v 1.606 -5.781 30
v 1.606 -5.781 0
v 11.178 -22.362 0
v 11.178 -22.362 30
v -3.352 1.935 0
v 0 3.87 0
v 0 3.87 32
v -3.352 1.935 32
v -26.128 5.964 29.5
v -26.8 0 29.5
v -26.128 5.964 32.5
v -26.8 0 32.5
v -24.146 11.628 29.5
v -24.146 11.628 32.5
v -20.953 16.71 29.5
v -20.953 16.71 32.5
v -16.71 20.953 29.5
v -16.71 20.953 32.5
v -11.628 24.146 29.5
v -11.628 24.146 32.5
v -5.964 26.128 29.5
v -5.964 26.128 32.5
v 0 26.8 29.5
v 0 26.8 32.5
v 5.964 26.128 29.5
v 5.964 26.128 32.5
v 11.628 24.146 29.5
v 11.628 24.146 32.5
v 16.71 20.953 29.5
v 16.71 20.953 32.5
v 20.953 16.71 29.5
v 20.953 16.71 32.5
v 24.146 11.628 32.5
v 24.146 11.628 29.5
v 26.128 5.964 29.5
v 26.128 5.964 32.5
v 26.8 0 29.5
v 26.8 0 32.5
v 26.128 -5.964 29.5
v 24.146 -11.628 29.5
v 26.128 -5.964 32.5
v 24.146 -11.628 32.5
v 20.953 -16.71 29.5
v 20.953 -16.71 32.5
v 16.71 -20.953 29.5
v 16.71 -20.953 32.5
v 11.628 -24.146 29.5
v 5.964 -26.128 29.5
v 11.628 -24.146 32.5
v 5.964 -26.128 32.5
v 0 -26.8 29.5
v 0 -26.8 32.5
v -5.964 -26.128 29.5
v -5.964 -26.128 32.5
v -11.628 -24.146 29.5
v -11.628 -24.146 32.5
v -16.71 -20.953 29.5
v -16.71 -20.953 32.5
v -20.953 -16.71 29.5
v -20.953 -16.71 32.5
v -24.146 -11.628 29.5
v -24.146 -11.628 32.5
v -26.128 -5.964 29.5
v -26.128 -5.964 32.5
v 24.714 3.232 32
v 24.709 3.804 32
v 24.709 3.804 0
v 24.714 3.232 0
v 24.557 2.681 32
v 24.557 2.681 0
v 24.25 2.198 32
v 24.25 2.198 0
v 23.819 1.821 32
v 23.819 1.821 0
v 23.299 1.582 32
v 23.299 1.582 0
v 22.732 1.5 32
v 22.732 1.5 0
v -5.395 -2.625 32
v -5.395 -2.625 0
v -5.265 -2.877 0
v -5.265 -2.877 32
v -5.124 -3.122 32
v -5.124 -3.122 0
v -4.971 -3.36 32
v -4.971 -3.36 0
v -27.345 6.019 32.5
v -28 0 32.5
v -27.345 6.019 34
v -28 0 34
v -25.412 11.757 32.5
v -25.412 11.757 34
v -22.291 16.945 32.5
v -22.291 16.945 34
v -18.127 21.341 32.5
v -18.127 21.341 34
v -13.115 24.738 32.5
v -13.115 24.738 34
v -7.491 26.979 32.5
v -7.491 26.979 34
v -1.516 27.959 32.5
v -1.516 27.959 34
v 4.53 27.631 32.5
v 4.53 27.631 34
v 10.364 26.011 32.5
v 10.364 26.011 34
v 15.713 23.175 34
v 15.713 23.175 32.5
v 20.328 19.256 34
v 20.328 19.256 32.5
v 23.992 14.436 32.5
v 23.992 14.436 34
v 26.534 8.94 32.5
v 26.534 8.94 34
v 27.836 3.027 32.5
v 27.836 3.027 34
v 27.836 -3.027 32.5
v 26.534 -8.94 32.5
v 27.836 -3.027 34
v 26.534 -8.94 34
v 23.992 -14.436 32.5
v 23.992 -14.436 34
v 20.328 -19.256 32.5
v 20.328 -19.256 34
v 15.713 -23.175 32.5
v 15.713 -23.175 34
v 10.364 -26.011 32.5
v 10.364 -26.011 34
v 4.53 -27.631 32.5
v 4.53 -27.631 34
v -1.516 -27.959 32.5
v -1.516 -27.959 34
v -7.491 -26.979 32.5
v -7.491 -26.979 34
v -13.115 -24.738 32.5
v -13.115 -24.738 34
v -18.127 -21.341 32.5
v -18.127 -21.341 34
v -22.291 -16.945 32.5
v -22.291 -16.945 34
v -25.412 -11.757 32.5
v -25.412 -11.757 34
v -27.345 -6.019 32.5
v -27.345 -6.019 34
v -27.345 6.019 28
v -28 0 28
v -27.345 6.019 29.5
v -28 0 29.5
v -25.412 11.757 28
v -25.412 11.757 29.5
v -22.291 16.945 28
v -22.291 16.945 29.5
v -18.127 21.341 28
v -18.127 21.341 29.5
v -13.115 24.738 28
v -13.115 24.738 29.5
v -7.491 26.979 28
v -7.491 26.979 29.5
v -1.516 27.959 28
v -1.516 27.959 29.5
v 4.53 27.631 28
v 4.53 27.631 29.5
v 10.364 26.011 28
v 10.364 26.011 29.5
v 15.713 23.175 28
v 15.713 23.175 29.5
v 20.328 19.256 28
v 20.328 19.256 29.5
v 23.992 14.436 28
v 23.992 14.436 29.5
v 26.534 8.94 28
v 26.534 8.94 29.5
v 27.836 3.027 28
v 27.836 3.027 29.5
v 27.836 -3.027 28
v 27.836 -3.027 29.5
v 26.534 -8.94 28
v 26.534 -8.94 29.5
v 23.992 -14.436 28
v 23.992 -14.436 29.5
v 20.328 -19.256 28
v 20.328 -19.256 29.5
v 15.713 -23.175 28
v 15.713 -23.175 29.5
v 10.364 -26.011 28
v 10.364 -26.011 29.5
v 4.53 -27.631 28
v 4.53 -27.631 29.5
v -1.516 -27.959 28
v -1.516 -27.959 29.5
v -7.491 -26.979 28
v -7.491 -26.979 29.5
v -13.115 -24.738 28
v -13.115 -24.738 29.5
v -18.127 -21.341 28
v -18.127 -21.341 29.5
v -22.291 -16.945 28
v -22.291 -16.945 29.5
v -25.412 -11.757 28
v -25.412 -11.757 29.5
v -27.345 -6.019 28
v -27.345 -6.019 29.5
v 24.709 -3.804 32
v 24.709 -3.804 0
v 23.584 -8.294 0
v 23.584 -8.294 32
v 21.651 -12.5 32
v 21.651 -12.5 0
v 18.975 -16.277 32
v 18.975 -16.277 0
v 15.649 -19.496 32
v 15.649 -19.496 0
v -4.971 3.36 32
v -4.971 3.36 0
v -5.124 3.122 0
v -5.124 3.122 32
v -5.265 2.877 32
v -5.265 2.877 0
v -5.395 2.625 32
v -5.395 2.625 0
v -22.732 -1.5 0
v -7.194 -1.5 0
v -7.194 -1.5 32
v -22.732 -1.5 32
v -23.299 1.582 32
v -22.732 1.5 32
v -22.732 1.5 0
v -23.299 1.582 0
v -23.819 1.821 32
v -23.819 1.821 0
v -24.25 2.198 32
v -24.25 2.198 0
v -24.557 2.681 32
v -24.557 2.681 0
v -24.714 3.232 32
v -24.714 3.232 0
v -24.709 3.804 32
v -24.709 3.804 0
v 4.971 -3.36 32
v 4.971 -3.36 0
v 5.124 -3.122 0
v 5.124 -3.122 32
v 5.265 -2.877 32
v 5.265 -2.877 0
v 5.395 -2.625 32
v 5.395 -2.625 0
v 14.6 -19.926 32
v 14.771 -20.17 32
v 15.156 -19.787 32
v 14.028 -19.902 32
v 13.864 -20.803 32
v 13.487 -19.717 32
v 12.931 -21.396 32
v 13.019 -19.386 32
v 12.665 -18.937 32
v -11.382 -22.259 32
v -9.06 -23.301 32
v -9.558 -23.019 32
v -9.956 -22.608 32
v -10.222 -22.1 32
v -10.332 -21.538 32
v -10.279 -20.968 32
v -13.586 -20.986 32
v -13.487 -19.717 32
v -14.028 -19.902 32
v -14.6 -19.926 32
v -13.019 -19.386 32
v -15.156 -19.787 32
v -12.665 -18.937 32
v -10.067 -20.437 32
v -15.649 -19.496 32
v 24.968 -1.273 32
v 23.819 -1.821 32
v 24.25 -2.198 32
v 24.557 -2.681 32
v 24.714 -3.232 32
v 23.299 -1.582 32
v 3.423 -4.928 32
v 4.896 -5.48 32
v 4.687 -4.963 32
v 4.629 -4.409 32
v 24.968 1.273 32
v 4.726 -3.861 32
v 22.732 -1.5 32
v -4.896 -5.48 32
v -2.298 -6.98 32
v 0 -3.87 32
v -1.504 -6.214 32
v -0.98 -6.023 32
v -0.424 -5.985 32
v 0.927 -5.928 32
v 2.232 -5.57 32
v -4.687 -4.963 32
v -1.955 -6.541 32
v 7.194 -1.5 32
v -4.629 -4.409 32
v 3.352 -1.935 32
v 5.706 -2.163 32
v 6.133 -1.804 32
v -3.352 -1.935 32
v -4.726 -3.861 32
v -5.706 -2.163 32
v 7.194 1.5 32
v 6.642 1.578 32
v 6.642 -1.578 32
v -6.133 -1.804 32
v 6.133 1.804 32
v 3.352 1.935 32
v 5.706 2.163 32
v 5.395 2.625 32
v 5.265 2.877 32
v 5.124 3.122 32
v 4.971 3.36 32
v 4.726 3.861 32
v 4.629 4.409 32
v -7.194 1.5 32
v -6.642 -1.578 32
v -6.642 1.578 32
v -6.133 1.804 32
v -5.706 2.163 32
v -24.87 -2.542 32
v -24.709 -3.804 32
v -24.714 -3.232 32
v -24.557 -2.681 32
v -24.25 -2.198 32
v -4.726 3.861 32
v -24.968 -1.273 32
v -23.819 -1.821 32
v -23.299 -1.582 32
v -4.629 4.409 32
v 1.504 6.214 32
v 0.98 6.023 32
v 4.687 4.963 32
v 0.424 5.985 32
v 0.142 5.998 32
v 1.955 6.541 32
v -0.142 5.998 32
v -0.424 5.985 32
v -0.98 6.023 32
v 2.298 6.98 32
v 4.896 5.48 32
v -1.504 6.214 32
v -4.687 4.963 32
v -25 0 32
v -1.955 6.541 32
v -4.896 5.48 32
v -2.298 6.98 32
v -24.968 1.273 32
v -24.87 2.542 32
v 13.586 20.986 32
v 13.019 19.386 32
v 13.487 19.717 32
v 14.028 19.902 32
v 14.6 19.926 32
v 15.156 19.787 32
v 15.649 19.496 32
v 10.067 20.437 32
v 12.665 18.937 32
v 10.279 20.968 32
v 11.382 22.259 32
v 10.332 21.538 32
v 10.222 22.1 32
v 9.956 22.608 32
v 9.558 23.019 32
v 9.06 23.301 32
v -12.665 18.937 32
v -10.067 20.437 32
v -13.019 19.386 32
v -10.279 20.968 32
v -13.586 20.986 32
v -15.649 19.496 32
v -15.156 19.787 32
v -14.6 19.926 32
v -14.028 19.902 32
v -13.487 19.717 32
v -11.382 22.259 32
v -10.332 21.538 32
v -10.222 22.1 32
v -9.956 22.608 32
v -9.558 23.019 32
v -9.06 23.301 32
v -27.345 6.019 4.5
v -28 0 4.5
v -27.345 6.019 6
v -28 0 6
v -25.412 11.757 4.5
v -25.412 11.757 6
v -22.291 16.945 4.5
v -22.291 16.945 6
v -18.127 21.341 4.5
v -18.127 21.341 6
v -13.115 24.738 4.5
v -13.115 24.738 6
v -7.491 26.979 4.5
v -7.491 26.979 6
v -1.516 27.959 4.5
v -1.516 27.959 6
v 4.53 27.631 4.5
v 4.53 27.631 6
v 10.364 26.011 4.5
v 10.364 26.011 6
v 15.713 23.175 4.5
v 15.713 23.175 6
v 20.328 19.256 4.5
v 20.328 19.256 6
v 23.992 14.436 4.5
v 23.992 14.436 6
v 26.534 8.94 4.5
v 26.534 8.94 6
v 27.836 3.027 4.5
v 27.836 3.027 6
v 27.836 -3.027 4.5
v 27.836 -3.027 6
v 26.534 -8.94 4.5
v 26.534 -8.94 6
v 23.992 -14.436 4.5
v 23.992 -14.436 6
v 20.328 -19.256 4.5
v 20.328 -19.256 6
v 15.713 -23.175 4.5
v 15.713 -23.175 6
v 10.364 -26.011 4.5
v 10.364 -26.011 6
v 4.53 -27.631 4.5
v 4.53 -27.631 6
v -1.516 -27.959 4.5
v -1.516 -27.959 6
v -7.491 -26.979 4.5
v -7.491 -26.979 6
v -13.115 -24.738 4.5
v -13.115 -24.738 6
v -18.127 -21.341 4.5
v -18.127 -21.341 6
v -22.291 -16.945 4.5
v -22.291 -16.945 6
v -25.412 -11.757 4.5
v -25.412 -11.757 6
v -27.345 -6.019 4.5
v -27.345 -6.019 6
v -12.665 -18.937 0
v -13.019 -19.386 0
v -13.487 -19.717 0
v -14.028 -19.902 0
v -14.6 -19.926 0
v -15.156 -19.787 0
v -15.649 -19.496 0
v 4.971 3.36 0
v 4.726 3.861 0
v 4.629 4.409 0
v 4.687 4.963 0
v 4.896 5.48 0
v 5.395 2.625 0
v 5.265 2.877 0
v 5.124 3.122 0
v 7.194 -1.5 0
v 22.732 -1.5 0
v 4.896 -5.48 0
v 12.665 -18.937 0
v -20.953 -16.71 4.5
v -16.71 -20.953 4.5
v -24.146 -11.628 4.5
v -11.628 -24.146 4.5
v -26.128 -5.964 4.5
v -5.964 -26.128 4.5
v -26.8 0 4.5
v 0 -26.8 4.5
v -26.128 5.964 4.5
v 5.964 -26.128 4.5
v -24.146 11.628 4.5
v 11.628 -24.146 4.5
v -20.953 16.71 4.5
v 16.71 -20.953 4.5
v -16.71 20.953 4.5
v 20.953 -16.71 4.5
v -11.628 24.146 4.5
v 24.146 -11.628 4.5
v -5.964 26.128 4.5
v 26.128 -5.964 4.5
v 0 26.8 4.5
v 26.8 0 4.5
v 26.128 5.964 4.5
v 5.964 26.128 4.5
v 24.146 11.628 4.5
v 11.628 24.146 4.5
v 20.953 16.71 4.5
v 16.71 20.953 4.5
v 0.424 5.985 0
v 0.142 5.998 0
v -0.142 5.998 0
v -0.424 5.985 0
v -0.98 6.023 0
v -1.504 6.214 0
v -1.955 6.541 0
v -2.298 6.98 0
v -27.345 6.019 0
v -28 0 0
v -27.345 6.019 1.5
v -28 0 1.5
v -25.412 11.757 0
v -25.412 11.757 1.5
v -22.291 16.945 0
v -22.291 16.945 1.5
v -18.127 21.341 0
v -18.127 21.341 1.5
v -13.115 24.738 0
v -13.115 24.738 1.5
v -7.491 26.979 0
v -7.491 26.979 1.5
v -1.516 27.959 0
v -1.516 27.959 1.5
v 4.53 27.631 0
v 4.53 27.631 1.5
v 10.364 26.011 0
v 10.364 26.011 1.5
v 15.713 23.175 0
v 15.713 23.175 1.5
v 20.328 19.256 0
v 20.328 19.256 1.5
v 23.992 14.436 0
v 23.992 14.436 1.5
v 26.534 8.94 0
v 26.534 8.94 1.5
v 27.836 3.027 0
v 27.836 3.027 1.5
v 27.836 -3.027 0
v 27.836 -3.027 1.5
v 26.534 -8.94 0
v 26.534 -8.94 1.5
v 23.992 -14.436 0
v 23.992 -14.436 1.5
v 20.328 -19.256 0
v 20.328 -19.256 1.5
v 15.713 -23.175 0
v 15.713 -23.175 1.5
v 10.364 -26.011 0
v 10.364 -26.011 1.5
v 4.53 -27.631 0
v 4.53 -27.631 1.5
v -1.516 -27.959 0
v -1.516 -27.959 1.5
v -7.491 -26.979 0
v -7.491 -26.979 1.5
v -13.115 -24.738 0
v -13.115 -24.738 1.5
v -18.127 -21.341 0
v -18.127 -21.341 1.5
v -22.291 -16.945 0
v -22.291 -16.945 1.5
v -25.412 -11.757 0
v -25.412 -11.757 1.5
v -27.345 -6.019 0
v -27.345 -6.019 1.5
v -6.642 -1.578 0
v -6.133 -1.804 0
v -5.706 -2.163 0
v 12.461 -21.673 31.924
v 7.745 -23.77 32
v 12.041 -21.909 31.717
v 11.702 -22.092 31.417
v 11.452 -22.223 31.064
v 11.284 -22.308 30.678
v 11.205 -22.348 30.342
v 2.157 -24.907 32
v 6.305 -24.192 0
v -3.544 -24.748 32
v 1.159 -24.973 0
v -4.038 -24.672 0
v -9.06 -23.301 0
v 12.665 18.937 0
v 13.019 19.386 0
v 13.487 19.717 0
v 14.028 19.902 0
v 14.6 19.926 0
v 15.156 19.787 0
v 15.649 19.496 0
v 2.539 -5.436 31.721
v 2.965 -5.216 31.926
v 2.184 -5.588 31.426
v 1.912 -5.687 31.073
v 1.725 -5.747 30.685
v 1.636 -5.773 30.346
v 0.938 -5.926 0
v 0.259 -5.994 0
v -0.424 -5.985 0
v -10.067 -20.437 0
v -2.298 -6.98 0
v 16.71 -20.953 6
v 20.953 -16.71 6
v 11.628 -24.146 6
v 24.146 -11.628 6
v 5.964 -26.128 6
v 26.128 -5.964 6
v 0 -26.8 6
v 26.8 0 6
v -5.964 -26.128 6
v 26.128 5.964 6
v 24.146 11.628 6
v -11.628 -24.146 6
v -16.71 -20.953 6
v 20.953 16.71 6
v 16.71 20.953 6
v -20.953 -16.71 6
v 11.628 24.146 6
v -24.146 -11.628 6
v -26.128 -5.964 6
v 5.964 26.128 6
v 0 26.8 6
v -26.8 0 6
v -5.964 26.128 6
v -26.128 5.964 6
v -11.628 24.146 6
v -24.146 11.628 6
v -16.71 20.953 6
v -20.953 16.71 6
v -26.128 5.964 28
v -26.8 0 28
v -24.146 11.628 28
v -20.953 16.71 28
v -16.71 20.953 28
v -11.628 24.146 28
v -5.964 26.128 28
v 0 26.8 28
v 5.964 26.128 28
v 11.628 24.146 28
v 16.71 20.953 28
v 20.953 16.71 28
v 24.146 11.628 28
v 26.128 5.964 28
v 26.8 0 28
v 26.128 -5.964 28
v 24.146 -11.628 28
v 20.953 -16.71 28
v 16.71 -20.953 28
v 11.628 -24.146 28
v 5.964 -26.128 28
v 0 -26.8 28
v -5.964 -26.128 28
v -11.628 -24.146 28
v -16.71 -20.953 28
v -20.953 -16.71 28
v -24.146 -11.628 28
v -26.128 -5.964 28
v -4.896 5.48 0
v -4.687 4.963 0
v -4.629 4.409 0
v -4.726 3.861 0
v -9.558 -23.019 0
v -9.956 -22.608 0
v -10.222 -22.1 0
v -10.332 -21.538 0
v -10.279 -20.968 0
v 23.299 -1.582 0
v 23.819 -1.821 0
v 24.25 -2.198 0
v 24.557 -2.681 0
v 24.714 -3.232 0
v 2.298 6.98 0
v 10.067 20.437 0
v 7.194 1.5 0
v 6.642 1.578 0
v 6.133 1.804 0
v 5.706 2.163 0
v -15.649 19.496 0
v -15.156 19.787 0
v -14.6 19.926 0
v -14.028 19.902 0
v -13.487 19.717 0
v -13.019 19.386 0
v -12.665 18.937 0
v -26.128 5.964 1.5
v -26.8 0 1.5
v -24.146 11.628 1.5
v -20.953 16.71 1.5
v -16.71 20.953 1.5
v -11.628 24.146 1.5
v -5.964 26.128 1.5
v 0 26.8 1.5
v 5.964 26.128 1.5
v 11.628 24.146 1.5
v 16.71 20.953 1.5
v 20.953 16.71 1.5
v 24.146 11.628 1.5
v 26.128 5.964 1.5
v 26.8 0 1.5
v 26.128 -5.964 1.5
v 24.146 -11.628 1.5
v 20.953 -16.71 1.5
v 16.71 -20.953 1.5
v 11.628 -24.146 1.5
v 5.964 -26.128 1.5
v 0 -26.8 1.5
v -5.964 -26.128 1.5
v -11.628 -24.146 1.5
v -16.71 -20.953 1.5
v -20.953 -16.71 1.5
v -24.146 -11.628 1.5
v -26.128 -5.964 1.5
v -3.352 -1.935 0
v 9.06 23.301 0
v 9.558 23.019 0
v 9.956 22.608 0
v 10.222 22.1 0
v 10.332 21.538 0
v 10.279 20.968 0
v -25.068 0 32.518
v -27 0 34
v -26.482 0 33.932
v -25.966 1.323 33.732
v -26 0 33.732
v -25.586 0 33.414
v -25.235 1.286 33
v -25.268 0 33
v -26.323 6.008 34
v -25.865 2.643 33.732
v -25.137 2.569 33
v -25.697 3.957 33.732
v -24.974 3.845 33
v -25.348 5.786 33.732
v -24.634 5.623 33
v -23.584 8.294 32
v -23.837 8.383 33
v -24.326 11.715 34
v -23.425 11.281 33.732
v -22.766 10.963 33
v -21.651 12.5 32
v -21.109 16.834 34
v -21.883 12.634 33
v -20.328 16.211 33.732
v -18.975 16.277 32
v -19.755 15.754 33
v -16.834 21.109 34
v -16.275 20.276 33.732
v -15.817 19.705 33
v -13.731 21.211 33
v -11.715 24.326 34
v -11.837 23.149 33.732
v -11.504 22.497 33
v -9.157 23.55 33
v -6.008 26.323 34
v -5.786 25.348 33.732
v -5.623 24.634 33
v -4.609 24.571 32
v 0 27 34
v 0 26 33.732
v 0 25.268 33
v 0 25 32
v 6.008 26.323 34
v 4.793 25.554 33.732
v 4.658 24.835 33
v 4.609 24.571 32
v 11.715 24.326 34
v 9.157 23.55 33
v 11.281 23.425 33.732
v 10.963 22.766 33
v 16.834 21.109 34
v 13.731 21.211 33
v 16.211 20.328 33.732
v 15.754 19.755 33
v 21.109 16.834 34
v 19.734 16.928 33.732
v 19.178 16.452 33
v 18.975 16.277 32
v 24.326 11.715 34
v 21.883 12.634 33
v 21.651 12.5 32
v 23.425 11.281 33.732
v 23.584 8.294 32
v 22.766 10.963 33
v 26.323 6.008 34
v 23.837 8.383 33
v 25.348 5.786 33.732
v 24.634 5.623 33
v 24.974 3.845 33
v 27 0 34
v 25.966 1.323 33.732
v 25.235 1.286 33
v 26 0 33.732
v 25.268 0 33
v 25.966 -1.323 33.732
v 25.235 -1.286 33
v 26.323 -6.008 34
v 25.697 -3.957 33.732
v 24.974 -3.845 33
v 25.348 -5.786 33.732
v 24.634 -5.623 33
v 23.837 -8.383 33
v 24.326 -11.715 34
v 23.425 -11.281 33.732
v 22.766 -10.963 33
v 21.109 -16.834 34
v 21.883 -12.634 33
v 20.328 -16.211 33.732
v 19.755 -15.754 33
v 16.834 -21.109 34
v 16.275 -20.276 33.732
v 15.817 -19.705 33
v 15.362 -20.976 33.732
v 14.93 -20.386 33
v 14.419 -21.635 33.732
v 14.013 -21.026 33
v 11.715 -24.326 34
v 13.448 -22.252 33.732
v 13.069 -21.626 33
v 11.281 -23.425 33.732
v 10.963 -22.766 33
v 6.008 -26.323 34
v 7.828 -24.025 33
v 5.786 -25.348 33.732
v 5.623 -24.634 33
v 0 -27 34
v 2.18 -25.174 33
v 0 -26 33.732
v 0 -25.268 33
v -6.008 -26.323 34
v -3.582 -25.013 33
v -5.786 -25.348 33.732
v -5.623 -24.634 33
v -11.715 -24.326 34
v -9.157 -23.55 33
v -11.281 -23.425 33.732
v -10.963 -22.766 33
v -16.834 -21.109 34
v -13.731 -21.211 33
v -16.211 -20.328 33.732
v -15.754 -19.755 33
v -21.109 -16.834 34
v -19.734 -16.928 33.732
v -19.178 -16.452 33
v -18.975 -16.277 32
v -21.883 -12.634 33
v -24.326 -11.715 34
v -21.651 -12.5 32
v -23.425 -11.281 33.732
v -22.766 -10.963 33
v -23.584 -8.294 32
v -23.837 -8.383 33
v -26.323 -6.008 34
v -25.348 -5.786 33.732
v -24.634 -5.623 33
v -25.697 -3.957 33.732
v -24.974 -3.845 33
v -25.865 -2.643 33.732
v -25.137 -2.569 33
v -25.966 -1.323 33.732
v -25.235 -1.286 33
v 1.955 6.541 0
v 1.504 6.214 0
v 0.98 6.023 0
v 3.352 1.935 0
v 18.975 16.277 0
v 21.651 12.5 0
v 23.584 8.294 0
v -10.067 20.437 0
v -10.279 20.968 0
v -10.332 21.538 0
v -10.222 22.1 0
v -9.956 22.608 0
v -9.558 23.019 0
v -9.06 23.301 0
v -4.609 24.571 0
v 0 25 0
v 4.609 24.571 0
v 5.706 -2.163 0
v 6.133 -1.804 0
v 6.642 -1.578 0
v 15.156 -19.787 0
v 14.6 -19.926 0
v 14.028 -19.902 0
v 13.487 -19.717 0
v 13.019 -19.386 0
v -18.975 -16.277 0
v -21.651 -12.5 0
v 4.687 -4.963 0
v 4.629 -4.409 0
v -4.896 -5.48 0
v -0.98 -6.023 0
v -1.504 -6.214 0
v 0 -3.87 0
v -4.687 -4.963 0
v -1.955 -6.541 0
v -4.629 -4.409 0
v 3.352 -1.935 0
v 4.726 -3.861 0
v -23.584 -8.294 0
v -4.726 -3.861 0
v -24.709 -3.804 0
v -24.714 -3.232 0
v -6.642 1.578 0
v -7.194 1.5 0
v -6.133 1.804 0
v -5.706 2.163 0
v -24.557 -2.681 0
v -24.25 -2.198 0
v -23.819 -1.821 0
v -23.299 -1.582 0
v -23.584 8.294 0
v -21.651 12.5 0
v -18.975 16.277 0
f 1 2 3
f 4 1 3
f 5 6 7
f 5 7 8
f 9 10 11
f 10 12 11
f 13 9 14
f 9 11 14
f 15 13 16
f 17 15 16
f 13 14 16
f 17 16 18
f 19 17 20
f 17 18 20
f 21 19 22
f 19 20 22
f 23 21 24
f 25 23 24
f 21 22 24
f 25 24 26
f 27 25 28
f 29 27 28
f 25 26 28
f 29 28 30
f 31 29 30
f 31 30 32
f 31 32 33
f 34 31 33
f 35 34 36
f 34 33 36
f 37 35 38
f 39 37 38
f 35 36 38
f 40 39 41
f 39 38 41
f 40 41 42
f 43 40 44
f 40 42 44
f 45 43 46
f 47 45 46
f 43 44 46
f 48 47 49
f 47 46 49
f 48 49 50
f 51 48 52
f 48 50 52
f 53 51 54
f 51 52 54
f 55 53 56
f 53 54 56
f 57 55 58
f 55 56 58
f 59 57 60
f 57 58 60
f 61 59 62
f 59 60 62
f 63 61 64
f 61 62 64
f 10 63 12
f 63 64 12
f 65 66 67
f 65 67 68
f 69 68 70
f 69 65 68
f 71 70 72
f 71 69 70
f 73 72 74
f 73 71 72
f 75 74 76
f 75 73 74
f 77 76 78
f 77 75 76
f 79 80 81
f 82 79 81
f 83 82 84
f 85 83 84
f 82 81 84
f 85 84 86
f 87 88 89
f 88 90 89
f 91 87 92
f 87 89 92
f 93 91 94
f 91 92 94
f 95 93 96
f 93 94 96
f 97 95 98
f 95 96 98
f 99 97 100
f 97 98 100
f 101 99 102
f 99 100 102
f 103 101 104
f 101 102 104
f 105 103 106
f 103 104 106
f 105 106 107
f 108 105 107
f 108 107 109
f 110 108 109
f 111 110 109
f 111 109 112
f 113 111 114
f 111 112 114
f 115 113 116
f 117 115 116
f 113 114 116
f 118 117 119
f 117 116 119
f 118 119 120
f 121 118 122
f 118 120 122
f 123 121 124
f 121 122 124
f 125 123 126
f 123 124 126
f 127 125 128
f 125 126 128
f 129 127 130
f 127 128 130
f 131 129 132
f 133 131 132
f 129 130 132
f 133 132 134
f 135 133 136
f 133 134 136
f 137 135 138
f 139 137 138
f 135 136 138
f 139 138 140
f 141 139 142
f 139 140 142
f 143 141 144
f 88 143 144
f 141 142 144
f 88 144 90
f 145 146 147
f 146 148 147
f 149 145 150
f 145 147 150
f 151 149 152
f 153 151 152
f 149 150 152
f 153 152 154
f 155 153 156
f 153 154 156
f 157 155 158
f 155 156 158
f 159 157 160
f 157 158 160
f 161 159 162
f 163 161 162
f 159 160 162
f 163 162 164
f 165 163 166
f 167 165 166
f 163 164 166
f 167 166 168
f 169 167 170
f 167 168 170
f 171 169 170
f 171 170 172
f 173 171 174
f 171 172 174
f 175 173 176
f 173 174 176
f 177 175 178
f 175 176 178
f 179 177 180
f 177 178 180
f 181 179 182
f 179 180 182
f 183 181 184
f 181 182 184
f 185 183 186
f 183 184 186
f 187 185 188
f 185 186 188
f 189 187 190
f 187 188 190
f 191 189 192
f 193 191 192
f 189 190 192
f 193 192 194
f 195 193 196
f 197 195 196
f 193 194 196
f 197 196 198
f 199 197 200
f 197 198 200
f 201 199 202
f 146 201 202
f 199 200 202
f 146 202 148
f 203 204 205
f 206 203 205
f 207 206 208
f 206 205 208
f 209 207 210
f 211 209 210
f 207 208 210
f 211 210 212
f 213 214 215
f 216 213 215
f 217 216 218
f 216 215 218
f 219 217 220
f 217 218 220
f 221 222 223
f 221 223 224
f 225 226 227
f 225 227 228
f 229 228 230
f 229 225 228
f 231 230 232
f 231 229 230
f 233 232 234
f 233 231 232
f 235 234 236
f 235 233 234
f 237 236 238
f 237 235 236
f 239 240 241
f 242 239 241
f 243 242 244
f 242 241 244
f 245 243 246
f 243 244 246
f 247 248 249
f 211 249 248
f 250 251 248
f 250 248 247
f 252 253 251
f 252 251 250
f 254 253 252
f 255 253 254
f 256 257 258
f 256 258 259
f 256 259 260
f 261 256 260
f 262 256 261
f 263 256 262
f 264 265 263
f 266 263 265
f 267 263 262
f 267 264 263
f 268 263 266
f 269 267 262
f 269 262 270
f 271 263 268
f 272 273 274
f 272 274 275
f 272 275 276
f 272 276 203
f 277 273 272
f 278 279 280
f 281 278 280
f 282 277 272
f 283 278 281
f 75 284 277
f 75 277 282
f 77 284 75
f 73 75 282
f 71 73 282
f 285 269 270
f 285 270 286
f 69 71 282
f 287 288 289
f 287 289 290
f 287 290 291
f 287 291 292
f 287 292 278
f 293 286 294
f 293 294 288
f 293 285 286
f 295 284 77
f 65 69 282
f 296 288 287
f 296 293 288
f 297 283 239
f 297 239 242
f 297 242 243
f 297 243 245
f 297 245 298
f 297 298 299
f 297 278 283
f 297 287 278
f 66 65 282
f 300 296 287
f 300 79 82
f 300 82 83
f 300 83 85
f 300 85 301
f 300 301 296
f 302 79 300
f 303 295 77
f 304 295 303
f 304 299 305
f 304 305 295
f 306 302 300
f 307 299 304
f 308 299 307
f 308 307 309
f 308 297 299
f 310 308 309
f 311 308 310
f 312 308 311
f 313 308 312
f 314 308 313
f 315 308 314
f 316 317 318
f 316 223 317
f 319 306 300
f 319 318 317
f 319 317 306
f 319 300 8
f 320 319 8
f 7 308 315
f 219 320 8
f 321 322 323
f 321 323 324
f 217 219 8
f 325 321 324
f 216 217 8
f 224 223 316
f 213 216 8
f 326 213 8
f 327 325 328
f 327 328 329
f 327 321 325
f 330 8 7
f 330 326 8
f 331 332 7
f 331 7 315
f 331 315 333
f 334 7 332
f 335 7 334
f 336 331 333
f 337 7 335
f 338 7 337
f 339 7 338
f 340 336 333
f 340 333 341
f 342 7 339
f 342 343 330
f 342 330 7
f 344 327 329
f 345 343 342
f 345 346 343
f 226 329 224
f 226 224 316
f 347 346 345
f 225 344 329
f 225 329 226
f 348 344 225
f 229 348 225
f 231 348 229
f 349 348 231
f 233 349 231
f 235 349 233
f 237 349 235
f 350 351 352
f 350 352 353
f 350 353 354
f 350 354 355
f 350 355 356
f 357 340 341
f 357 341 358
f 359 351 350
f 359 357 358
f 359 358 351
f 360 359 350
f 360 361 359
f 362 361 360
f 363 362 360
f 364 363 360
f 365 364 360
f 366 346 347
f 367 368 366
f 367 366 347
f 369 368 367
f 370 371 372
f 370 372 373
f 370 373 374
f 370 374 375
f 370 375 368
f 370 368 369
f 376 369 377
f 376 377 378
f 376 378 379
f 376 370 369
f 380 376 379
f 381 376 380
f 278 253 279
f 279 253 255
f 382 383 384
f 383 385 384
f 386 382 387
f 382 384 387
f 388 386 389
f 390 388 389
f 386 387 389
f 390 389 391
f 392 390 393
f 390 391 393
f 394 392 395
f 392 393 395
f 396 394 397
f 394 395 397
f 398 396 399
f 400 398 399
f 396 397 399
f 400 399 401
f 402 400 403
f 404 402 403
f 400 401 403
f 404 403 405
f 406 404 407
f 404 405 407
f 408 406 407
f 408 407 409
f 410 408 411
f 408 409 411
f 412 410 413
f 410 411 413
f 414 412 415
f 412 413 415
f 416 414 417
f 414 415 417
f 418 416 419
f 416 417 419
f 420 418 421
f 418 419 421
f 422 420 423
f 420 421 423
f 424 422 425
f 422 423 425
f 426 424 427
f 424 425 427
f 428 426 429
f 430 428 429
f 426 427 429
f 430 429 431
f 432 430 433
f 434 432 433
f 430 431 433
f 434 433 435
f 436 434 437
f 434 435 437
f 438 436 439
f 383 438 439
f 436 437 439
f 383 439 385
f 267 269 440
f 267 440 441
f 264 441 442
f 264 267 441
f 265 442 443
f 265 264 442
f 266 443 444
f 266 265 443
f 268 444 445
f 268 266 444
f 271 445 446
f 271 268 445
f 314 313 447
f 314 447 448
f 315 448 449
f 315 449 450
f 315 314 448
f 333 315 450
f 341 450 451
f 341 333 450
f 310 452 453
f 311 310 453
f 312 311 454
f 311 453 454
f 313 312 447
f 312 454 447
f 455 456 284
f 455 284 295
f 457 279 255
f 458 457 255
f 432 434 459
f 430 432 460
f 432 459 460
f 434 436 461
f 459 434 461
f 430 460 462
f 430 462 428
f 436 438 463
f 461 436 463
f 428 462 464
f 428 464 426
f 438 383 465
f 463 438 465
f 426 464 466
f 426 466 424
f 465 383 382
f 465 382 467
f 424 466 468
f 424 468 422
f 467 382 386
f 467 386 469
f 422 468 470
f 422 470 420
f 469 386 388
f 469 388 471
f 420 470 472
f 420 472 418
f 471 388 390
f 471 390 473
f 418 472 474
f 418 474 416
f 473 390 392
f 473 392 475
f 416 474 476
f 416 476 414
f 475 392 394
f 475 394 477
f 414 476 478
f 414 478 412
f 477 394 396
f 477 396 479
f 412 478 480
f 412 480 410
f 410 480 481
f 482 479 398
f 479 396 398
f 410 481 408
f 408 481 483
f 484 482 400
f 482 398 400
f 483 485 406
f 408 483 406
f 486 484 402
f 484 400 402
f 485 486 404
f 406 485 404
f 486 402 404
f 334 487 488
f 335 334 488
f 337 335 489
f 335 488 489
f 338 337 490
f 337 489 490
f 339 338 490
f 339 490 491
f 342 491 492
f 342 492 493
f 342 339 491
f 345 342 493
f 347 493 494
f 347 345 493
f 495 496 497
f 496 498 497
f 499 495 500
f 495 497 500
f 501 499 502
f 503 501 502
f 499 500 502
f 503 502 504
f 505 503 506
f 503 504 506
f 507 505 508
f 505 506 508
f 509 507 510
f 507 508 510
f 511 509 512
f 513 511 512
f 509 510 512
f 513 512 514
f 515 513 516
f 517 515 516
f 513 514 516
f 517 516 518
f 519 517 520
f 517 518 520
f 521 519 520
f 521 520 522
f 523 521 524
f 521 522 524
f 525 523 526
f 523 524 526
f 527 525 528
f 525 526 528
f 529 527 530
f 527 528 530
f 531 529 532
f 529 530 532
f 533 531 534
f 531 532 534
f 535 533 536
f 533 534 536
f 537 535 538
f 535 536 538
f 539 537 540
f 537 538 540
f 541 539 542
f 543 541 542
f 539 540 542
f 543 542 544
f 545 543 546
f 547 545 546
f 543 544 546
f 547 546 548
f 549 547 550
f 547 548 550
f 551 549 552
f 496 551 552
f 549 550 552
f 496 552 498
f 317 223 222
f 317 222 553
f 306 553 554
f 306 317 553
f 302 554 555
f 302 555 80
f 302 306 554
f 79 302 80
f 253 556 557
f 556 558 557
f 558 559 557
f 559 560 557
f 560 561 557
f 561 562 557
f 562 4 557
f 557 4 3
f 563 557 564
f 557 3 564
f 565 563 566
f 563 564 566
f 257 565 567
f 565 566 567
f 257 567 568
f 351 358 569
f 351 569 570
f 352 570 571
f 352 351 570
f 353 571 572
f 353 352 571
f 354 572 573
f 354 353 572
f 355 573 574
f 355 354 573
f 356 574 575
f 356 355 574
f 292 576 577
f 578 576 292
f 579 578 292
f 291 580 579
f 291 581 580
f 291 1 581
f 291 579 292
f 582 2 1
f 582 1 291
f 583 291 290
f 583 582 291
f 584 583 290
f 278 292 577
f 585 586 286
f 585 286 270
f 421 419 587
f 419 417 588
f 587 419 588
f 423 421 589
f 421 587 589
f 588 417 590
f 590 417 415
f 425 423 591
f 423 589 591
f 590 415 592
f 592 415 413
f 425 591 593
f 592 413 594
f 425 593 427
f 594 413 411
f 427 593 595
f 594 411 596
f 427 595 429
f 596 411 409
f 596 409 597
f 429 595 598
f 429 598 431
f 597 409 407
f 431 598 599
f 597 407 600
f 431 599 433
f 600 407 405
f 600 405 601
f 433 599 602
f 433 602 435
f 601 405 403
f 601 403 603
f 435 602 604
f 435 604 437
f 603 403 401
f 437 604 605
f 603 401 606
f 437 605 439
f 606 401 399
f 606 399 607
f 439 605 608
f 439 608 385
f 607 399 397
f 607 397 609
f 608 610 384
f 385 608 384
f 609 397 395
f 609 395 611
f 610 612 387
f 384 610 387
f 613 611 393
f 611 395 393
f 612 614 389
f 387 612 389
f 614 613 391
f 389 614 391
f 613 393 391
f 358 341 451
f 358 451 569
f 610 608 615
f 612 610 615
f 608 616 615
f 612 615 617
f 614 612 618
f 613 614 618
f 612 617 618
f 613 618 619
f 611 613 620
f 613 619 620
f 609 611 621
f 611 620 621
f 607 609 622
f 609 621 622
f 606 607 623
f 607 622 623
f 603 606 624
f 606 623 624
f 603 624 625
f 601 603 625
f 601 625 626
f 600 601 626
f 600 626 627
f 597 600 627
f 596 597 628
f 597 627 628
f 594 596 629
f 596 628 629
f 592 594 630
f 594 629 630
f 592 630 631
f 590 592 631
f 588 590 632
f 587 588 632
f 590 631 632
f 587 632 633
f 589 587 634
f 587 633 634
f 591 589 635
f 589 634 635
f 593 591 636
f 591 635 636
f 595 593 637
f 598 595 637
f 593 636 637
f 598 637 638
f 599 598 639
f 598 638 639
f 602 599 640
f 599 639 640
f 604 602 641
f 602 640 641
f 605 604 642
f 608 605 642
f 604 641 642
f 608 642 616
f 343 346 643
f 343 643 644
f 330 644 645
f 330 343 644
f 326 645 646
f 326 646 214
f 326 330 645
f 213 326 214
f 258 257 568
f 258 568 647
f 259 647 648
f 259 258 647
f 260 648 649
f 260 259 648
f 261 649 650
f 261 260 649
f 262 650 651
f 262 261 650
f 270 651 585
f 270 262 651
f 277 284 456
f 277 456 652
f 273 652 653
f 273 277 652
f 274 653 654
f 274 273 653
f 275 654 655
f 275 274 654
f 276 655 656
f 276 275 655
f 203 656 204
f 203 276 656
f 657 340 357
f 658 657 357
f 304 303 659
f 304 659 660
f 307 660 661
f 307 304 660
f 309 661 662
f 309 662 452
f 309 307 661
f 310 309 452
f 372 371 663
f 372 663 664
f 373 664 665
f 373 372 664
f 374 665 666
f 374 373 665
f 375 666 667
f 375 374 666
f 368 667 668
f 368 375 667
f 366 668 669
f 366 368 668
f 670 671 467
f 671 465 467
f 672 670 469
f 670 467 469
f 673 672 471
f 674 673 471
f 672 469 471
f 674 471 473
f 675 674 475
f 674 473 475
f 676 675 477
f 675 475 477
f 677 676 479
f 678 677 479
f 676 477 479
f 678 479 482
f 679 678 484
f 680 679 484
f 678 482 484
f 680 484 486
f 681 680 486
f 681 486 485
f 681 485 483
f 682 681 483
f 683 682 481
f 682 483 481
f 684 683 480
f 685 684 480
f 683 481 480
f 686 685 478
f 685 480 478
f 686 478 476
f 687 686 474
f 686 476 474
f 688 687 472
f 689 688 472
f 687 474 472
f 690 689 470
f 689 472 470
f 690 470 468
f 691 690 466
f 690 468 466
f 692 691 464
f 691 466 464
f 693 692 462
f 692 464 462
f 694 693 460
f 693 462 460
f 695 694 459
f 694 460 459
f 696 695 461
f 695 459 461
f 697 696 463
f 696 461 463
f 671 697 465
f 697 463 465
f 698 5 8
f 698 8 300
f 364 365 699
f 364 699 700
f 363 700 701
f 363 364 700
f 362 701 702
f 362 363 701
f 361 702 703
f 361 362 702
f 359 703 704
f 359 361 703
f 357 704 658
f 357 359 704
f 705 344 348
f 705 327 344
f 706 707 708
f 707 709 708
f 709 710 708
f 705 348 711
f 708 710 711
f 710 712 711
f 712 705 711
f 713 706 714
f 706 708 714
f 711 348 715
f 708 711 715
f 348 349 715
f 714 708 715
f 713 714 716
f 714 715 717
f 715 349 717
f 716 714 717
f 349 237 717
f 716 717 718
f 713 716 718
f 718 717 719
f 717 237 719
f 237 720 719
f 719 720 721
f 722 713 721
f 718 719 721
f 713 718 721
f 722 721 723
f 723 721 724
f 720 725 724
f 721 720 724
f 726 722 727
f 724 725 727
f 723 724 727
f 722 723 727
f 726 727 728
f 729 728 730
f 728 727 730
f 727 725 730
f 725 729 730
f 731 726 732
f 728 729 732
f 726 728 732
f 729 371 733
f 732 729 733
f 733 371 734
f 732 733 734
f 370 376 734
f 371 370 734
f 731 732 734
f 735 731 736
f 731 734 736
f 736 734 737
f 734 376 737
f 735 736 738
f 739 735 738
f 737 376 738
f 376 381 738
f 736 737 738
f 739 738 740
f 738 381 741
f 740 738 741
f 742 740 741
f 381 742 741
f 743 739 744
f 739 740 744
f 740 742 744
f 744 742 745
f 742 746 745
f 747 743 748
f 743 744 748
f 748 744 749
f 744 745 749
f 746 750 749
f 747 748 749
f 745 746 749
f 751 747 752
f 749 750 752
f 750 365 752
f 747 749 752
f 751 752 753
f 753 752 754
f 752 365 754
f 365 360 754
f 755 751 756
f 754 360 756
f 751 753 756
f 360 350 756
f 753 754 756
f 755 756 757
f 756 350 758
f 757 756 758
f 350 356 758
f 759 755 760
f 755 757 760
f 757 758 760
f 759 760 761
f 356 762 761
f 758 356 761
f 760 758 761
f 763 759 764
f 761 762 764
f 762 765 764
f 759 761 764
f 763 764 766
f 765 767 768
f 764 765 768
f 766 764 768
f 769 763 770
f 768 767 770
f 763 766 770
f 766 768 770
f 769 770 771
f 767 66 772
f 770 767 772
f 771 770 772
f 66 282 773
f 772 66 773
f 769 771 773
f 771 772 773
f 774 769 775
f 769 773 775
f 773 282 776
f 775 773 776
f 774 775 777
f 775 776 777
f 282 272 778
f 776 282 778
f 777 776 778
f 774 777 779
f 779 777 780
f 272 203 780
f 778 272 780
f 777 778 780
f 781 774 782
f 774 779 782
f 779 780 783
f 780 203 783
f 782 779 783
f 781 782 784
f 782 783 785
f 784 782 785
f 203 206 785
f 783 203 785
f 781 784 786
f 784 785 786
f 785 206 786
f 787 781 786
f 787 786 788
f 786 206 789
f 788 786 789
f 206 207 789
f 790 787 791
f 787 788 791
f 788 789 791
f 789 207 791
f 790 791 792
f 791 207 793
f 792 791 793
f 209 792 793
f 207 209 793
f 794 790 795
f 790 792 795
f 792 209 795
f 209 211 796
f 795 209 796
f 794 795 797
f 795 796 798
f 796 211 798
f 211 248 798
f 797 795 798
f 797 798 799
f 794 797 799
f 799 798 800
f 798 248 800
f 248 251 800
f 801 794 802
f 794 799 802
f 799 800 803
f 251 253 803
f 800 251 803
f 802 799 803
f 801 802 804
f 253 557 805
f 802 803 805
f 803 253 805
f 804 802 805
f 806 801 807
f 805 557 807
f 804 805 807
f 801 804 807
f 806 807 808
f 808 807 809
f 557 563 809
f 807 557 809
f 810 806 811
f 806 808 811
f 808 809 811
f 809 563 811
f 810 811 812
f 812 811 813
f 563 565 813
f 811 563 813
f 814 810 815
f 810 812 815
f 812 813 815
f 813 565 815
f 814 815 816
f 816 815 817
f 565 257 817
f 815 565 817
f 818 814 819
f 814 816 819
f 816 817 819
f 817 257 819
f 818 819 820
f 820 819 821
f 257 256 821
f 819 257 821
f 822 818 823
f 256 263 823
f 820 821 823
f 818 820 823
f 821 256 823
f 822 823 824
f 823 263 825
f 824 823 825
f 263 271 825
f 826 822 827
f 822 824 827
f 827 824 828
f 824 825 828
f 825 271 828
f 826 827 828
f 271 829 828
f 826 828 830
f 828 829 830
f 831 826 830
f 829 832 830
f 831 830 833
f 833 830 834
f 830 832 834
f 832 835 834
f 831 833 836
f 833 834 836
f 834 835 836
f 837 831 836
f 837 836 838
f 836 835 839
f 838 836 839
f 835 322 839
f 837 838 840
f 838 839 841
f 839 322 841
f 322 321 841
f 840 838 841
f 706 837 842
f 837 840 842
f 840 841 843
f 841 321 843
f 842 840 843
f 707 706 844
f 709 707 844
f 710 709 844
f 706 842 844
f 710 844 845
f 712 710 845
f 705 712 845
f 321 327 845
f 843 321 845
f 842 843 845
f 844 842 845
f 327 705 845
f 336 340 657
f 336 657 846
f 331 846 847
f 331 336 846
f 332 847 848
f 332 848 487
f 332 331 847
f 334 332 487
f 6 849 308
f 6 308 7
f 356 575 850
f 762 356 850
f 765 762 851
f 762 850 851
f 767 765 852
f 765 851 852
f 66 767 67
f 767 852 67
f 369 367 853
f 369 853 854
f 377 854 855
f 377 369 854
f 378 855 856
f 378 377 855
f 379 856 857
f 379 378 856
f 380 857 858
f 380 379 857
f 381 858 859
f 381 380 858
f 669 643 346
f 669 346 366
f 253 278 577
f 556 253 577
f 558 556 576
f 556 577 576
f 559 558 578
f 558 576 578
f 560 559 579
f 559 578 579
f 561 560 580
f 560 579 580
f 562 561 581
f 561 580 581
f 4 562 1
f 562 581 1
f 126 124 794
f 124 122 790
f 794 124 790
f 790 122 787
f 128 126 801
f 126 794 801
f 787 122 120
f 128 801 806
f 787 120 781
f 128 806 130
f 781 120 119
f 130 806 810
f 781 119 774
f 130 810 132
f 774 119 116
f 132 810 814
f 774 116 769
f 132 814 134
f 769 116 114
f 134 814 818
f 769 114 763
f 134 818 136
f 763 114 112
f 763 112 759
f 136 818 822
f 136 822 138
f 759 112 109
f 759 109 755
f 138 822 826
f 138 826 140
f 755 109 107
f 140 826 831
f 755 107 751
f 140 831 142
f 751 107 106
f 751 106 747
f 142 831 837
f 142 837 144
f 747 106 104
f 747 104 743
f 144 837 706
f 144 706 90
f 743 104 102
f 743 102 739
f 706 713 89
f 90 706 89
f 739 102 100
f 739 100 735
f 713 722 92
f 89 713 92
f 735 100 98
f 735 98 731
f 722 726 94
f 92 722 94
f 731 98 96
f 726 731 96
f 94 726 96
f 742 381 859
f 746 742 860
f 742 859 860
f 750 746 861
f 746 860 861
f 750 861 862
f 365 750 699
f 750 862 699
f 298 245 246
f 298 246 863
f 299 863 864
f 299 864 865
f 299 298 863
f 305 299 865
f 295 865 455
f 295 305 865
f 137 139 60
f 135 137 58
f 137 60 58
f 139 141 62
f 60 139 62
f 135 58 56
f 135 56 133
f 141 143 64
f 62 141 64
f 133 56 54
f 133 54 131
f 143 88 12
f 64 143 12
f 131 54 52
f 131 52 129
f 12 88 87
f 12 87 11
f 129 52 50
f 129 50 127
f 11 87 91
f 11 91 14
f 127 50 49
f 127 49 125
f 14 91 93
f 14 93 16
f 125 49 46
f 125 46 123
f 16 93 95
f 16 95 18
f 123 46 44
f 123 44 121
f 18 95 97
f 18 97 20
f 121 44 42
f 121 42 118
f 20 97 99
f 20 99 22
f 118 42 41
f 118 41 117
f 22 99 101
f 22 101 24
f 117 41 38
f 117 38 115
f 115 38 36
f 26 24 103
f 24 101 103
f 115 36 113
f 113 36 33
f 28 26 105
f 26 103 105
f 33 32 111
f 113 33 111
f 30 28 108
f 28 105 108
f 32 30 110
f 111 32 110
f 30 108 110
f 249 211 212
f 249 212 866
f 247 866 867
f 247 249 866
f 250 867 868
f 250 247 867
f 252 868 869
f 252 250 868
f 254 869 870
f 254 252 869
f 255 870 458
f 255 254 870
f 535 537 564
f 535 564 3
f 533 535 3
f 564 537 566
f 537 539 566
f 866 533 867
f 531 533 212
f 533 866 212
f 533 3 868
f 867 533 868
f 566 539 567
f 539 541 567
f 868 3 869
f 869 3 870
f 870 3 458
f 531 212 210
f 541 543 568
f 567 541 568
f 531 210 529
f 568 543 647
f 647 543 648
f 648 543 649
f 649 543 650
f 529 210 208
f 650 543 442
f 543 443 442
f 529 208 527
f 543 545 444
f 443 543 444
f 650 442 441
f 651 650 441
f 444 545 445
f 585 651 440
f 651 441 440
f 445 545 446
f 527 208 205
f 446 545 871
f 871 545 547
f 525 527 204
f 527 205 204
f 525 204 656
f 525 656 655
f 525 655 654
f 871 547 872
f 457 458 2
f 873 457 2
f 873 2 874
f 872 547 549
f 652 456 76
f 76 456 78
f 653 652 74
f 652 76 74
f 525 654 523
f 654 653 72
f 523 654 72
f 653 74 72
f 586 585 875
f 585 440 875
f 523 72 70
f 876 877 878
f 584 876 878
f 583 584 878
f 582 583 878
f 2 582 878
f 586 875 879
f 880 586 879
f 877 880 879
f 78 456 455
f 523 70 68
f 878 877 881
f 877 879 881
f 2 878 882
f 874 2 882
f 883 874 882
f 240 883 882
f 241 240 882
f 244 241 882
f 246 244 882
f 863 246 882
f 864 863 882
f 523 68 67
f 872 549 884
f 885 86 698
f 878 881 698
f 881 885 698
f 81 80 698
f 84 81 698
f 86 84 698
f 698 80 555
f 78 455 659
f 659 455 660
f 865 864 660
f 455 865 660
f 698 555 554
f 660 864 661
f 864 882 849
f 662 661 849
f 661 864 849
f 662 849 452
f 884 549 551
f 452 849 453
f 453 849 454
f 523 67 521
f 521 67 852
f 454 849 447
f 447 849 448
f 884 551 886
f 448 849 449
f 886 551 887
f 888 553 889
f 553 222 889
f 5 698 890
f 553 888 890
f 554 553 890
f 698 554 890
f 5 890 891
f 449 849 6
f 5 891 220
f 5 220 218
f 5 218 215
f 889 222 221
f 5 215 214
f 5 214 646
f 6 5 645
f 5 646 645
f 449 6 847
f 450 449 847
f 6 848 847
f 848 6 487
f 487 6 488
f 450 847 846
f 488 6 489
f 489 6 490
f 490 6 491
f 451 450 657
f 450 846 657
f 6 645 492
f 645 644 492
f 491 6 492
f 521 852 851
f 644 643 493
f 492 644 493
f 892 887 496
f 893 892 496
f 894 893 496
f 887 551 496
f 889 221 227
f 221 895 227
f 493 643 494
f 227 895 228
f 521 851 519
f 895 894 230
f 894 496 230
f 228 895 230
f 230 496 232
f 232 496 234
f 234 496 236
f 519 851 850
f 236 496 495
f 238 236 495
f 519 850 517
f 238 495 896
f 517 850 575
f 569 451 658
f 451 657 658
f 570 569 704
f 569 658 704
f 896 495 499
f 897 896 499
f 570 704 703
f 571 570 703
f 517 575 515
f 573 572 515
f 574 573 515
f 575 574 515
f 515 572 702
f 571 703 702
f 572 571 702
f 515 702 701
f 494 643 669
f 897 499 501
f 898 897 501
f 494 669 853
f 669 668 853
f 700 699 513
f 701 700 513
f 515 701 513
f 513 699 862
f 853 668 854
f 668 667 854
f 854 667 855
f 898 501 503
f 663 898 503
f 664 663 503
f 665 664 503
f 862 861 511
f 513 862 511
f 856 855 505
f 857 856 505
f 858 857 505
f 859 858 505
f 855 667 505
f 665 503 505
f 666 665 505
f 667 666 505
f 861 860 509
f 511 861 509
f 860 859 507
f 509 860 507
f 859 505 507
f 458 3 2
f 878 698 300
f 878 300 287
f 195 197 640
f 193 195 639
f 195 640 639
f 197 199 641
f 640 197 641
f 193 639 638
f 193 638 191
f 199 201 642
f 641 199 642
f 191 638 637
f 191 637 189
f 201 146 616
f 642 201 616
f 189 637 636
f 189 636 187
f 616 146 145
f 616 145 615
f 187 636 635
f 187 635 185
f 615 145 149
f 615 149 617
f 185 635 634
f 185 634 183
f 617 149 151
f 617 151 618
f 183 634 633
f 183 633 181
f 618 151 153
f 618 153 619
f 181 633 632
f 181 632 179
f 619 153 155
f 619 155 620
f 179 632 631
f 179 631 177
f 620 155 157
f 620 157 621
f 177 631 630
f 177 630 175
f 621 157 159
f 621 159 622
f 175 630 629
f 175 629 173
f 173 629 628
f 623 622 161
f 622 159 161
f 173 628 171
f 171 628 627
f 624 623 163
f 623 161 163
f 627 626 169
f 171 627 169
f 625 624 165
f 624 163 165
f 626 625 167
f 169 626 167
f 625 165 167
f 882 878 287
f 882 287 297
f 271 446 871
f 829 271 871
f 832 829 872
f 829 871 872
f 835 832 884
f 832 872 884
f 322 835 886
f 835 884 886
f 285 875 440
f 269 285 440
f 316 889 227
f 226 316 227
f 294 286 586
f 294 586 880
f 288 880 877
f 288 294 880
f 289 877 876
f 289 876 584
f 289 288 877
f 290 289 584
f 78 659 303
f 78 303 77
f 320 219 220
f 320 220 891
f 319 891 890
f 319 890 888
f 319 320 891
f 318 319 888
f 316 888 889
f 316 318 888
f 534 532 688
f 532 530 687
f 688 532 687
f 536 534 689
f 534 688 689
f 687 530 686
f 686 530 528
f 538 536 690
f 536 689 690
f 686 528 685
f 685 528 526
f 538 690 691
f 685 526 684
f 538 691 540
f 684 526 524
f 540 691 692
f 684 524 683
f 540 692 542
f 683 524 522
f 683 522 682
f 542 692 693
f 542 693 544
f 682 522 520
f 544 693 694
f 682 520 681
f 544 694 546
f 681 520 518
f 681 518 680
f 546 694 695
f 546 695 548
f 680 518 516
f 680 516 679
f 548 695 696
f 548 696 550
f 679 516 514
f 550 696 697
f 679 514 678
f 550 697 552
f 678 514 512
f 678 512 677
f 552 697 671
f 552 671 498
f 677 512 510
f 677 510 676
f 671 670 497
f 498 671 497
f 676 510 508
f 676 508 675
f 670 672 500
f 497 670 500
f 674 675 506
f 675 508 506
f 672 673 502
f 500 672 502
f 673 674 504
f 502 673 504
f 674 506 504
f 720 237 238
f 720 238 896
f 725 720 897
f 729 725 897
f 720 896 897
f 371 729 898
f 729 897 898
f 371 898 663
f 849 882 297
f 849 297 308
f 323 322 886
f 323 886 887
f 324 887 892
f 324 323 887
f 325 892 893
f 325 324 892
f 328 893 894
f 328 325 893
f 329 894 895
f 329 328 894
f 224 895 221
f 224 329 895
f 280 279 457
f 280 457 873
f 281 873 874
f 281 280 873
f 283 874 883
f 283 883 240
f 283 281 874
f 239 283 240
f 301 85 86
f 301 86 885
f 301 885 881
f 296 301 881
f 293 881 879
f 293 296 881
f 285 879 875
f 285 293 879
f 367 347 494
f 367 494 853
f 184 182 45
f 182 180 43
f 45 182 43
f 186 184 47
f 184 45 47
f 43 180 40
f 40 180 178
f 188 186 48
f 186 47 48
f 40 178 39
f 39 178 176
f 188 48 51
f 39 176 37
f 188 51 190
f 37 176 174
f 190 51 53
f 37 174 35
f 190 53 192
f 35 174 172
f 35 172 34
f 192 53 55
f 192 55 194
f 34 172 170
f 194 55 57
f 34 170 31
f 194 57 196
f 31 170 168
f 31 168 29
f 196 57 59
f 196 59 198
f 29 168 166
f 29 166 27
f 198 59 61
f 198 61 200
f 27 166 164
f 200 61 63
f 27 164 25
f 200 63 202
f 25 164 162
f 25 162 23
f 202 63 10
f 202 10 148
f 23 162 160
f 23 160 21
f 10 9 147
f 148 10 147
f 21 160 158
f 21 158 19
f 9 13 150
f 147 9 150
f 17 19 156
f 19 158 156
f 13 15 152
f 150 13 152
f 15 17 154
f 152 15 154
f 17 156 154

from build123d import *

# Parameters (mm, degrees)
SKETCH2_W           = 25
SKETCH2_H           = 3
BOSS_EXTRUDE1_DEPTH = 32
CIRPATTERN1_COUNT   = 6
SKETCH5_R           = 6
BOSS_EXTRUDE2_DEPTH = 32
AXLEHOLE_DEPTH      = 53.191951405
FILLET1_R           = 2


with BuildPart() as part:
    # Sketch1 → Revolve1 (revolve)
    with BuildSketch(Plane.XZ, mode=Mode.PRIVATE) as revolve1_sk:
        with BuildLine():
            Line((25, 0), (28, 0))
            Line((28, 0), (28, 1.5))
            Line((28, 1.5), (26.8, 1.5))
            Line((26.8, 1.5), (26.8, 4.5))
            Line((26.8, 4.5), (28, 4.5))
            Line((28, 4.5), (28, 6))
            Line((28, 6), (26.8, 6))
            Line((26.8, 6), (26.8, 28))
            Line((26.8, 28), (28, 28))
            Line((28, 28), (28, 29.5))
            Line((28, 29.5), (26.8, 29.5))
            Line((26.8, 29.5), (26.8, 32.5))
            Line((26.8, 32.5), (28, 32.5))
            Line((28, 32.5), (28, 33.999996833))
            Line((28, 33.999996833), (27, 33.999996833))
            ThreePointArc((27, 33.999996833), (25.585786438, 33.414213562), (25, 32))
            Line((25, 32), (25, 0))
        make_face()
    revolve(revolve1_sk.sketch.rotate(Axis((0, 0, 34), (0, 0, -1)), 180), axis=Axis((0, 0, 34), (0, 0, -1)))

    # Sketch2 → Boss-Extrude1 (add)
    with BuildSketch(Plane.XY):
        with Locations((12.5, 0)):
            Rectangle(SKETCH2_W, SKETCH2_H)
    boss_extrude1 = extrude(amount=BOSS_EXTRUDE1_DEPTH)

    # CirPattern1: Boss-Extrude1 ×6 about axis
    cirpattern1_axis = Axis((0, 0, 0), (0, 0, 1))
    for i in range(1, CIRPATTERN1_COUNT):
        add(boss_extrude1.rotate(cirpattern1_axis, i * 360 / CIRPATTERN1_COUNT))

    # Sketch5 → Boss-Extrude2 (add)
    with BuildSketch(Plane.XY):
        Circle(SKETCH5_R)
    extrude(amount=BOSS_EXTRUDE2_DEPTH)

    # Sketch6 → AxleHole (cut, through all)
    with BuildSketch(Plane.XY):
        Polygon((0, -3.87), (3.351518313, -1.935), (3.351518313, 1.935), (0, 3.87), (-3.351518313, 1.935), (-3.351518313, -1.935), align=None)
    extrude(amount=AXLEHOLE_DEPTH, mode=Mode.SUBTRACT)

    # Fillet1
    # the kernel refuses this fillet: 2 mm, written as the material it adds along each edge
    with BuildSketch(Plane(origin=(-24.954959427, -1.5, 32), x_dir=(0.10620109039764976, -0.9943446728365121, 0), z_dir=(0, 0, -1))) as fillet1_piece_1:
        with BuildLine():
            CenterArc((2.224755634, -1.997850608), FILLET1_R, 87.343441845, 98.752929077)
            Line((0.236066288, -2.210252789), (0.196292501, -2.214500833))
            Line((0.196292501, -2.214500833), (-0.039773787, -0.004248044))
            Line((-0.039773787, -0.004248044), (-0.001853963, 0.039957012))
            ThreePointArc((-0.001853963, 0.039957012), (1.158726893, 0.066867397), (2.319307748, 0.039957012))
            Line((2.319307748, 0.039957012), (2.317453785, 0))
        make_face()
    extrude(amount=32)
    with BuildSketch(Plane(origin=(-13.776517819, -20.861628814, 32), x_dir=(-0.8080272015953212, 0.589145178612228, 0), z_dir=(0, 0, -1)), Plane(origin=(13.776517819, 20.861628814, 32), x_dir=(0.8080272015953204, -0.589145178612229, 0), z_dir=(0, 0, -1)), Plane(origin=(24.954959427, -1.5, 32), x_dir=(-0.10620109039765001, -0.994344672836512, 0), z_dir=(0, 0, -1)), Plane(origin=(-11.178441608, 22.361628814, 32), x_dir=(0.9142282919929711, 0.4051994942242834, 0), z_dir=(0, 0, -1)), Plane(origin=(-24.954959427, 1.5, 32), x_dir=(0.10620109039765026, 0.994344672836512, 0), z_dir=(0, 0, -1))) as fillet1_piece_2:
        with BuildLine():
            CenterArc((2.224755634, 1.997850608), FILLET1_R, 173.903629078, 98.752929077)
            Line((0.236066288, 2.210252789), (0.196292501, 2.214500833))
            Line((0.196292501, 2.214500833), (-0.039773787, 0.004248044))
            Line((-0.039773787, 0.004248044), (-0.001853963, -0.039957012))
            ThreePointArc((-0.001853963, -0.039957012), (1.158726893, -0.066867397), (2.319307748, -0.039957012))
            Line((2.319307748, -0.039957012), (2.317453785, 0))
        make_face()
    extrude(amount=32)
    with BuildSketch(Plane(origin=(-11.178441608, -22.361628814, 32), x_dir=(0.5000000000000002, 0.8660254037844387, 0), z_dir=(0, 0, -1)), Plane(origin=(13.776517819, -20.861628814, 32), x_dir=(-0.5000000000000002, 0.8660254037844387, 0), z_dir=(0, 0, -1)), Plane(origin=(24.954959427, 1.5, 32), x_dir=(-1, 0, 0), z_dir=(0, 0, -1)), Plane(origin=(11.178441608, 22.361628814, 32), x_dir=(-0.4999999999999994, -0.8660254037844389, 0), z_dir=(0, 0, -1)), Plane(origin=(-13.776517819, 20.861628814, 32), x_dir=(0.5000000000000007, -0.8660254037844382, 0), z_dir=(0, 0, -1))) as fillet1_piece_3:
        with BuildLine():
            CenterArc((2.222823584, 2), FILLET1_R, 171.247070923, 98.752929077)
            Line((0.246116119, 2.304347826), (0.20658197, 2.310434783))
            ThreePointArc((0.20658197, 2.310434783), (0.056568819, 1.159275304), (-0.039927935, 0.0024))
            Line((-0.039927935, 0.0024), (0, -0.04))
            Line((0, -0.04), (2.222823584, -0.04))
            Line((2.222823584, -0.04), (2.222823584, 0))
        make_face()
    extrude(amount=32)
    with BuildSketch(Plane(origin=(5.809475019, 1.5, 32), x_dir=(1, 0, 0), z_dir=(0, 0, -1)), Plane(origin=(4.203775615, -4.281152949, 32), x_dir=(0.5000000000000001, -0.8660254037844386, 0), z_dir=(0, 0, -1)), Plane(origin=(1.605699404, 5.781152949, 32), x_dir=(0.4999999999999986, 0.8660254037844394, 0), z_dir=(0, 0, -1)), Plane(origin=(-4.203775615, 4.281152949, 32), x_dir=(-0.5000000000000004, 0.8660254037844384, 0), z_dir=(0, 0, -1)), Plane(origin=(-5.809475019, -1.5, 32), x_dir=(-1, 0, 0), z_dir=(0, 0, -1)), Plane(origin=(-1.605699404, -5.781152949, 32), x_dir=(-0.4999999999999988, -0.8660254037844393, 0), z_dir=(0, 0, -1))) as fillet1_piece_4:
        with BuildLine():
            CenterArc((1.384272266, -2), FILLET1_R, 90, 64.055520228)
            Line((-0.414164556, -1.125), (-0.450133292, -1.1075))
            ThreePointArc((-0.450133292, -1.1075), (-0.216451666, -0.559050695), (-0.038729833, 0.01))
            Line((-0.038729833, 0.01), (0, 0.04))
            Line((0, 0.04), (1.384272266, 0.04))
            Line((1.384272266, 0.04), (1.384272266, 0))
        make_face()
    extrude(amount=32)
    with BuildSketch(Plane(origin=(4.203775615, 4.281152949, 32), x_dir=(0.6399622417657335, -0.7684063567632539, 0), z_dir=(0, 0, -1)), Plane(origin=(5.809475019, -1.5, 32), x_dir=(-0.3454783045035584, -0.9384267372135913, 0), z_dir=(0, 0, -1)), Plane(origin=(-1.605699404, 5.781152949, 32), x_dir=(0.9854405462692932, 0.1700203804503366, 0), z_dir=(0, 0, -1)), Plane(origin=(-5.809475019, 1.5, 32), x_dir=(0.3454783045035597, 0.9384267372135907, 0), z_dir=(0, 0, -1))) as fillet1_piece_5:
        with BuildLine():
            CenterArc((1.398617439, -1.989994715), FILLET1_R, 95.733483793, 64.055520228)
            Line((-0.478236035, -1.299038106), (-0.515773105, -1.285218973))
            Line((-0.515773105, -1.285218973), (-0.037537069, 0.013819132))
            Line((-0.037537069, 0.013819132), (0.00399605, 0.039799894))
            ThreePointArc((0.00399605, 0.039799894), (0.599407474, 0.009984144), (1.194818898, 0.039799894))
            Line((1.194818898, 0.039799894), (1.198814948, 0))
        make_face()
    extrude(amount=32)
    with BuildSketch(Plane(origin=(-4.203775615, -4.281152949, 32), x_dir=(-0.4999999999999996, -0.8660254037844388, 0), z_dir=(0, 0, -1))) as fillet1_piece_6:
        with BuildLine():
            CenterArc((1.384272266, 2), FILLET1_R, 205.944479772, 64.055520228)
            Line((-0.414164556, 1.125), (-0.450133292, 1.1075))
            ThreePointArc((-0.450133292, 1.1075), (-0.216451666, 0.559050695), (-0.038729833, -0.01))
            Line((-0.038729833, -0.01), (0, -0.04))
            Line((0, -0.04), (1.384272266, -0.04))
            Line((1.384272266, -0.04), (1.384272266, 0))
        make_face()
    extrude(amount=32)
    # the kernel refuses this fillet: 2 mm, written as the material it takes off along each edge
    with BuildSketch(Plane(origin=(-0.894300596, -1.45102593, 32), x_dir=(0.8660254037844385, 0.5000000000000003, 0), z_dir=(0.5000000000000003, -0.8660254037844386, 0))) as fillet1_2_piece_1_section:
        with BuildLine():
            CenterArc((FILLET1_R, -FILLET1_R), FILLET1_R, 90, 90)
            Line((0, -FILLET1_R), (-FILLET1_R * 0.02, -FILLET1_R))
            Line((-FILLET1_R * 0.02, -FILLET1_R), (-FILLET1_R * 0.02, FILLET1_R * 0.02))
            Line((-FILLET1_R * 0.02, FILLET1_R * 0.02), (FILLET1_R, FILLET1_R * 0.02))
            Line((FILLET1_R, FILLET1_R * 0.02), (FILLET1_R, 0))
        make_face()
    fillet1_2_piece_1 = extrude(amount=29.145484408, mode=Mode.PRIVATE)
    fillet1_2_piece_1 = fillet1_2_piece_1 - Plane(origin=(0, 0, 31.546531325), x_dir=(1, 0, 0), z_dir=(0, 0, -1)) * Cylinder(6, 67, mode=Mode.PRIVATE)
    fillet1_2_piece_1 = fillet1_2_piece_1 & Plane(origin=(0, 0, 31.546531325), x_dir=(-1, 0, 0), z_dir=(0, 0, -1)) * Cylinder(25, 67, mode=Mode.PRIVATE)
    add(fillet1_2_piece_1, mode=Mode.SUBTRACT)


solid = part.part
